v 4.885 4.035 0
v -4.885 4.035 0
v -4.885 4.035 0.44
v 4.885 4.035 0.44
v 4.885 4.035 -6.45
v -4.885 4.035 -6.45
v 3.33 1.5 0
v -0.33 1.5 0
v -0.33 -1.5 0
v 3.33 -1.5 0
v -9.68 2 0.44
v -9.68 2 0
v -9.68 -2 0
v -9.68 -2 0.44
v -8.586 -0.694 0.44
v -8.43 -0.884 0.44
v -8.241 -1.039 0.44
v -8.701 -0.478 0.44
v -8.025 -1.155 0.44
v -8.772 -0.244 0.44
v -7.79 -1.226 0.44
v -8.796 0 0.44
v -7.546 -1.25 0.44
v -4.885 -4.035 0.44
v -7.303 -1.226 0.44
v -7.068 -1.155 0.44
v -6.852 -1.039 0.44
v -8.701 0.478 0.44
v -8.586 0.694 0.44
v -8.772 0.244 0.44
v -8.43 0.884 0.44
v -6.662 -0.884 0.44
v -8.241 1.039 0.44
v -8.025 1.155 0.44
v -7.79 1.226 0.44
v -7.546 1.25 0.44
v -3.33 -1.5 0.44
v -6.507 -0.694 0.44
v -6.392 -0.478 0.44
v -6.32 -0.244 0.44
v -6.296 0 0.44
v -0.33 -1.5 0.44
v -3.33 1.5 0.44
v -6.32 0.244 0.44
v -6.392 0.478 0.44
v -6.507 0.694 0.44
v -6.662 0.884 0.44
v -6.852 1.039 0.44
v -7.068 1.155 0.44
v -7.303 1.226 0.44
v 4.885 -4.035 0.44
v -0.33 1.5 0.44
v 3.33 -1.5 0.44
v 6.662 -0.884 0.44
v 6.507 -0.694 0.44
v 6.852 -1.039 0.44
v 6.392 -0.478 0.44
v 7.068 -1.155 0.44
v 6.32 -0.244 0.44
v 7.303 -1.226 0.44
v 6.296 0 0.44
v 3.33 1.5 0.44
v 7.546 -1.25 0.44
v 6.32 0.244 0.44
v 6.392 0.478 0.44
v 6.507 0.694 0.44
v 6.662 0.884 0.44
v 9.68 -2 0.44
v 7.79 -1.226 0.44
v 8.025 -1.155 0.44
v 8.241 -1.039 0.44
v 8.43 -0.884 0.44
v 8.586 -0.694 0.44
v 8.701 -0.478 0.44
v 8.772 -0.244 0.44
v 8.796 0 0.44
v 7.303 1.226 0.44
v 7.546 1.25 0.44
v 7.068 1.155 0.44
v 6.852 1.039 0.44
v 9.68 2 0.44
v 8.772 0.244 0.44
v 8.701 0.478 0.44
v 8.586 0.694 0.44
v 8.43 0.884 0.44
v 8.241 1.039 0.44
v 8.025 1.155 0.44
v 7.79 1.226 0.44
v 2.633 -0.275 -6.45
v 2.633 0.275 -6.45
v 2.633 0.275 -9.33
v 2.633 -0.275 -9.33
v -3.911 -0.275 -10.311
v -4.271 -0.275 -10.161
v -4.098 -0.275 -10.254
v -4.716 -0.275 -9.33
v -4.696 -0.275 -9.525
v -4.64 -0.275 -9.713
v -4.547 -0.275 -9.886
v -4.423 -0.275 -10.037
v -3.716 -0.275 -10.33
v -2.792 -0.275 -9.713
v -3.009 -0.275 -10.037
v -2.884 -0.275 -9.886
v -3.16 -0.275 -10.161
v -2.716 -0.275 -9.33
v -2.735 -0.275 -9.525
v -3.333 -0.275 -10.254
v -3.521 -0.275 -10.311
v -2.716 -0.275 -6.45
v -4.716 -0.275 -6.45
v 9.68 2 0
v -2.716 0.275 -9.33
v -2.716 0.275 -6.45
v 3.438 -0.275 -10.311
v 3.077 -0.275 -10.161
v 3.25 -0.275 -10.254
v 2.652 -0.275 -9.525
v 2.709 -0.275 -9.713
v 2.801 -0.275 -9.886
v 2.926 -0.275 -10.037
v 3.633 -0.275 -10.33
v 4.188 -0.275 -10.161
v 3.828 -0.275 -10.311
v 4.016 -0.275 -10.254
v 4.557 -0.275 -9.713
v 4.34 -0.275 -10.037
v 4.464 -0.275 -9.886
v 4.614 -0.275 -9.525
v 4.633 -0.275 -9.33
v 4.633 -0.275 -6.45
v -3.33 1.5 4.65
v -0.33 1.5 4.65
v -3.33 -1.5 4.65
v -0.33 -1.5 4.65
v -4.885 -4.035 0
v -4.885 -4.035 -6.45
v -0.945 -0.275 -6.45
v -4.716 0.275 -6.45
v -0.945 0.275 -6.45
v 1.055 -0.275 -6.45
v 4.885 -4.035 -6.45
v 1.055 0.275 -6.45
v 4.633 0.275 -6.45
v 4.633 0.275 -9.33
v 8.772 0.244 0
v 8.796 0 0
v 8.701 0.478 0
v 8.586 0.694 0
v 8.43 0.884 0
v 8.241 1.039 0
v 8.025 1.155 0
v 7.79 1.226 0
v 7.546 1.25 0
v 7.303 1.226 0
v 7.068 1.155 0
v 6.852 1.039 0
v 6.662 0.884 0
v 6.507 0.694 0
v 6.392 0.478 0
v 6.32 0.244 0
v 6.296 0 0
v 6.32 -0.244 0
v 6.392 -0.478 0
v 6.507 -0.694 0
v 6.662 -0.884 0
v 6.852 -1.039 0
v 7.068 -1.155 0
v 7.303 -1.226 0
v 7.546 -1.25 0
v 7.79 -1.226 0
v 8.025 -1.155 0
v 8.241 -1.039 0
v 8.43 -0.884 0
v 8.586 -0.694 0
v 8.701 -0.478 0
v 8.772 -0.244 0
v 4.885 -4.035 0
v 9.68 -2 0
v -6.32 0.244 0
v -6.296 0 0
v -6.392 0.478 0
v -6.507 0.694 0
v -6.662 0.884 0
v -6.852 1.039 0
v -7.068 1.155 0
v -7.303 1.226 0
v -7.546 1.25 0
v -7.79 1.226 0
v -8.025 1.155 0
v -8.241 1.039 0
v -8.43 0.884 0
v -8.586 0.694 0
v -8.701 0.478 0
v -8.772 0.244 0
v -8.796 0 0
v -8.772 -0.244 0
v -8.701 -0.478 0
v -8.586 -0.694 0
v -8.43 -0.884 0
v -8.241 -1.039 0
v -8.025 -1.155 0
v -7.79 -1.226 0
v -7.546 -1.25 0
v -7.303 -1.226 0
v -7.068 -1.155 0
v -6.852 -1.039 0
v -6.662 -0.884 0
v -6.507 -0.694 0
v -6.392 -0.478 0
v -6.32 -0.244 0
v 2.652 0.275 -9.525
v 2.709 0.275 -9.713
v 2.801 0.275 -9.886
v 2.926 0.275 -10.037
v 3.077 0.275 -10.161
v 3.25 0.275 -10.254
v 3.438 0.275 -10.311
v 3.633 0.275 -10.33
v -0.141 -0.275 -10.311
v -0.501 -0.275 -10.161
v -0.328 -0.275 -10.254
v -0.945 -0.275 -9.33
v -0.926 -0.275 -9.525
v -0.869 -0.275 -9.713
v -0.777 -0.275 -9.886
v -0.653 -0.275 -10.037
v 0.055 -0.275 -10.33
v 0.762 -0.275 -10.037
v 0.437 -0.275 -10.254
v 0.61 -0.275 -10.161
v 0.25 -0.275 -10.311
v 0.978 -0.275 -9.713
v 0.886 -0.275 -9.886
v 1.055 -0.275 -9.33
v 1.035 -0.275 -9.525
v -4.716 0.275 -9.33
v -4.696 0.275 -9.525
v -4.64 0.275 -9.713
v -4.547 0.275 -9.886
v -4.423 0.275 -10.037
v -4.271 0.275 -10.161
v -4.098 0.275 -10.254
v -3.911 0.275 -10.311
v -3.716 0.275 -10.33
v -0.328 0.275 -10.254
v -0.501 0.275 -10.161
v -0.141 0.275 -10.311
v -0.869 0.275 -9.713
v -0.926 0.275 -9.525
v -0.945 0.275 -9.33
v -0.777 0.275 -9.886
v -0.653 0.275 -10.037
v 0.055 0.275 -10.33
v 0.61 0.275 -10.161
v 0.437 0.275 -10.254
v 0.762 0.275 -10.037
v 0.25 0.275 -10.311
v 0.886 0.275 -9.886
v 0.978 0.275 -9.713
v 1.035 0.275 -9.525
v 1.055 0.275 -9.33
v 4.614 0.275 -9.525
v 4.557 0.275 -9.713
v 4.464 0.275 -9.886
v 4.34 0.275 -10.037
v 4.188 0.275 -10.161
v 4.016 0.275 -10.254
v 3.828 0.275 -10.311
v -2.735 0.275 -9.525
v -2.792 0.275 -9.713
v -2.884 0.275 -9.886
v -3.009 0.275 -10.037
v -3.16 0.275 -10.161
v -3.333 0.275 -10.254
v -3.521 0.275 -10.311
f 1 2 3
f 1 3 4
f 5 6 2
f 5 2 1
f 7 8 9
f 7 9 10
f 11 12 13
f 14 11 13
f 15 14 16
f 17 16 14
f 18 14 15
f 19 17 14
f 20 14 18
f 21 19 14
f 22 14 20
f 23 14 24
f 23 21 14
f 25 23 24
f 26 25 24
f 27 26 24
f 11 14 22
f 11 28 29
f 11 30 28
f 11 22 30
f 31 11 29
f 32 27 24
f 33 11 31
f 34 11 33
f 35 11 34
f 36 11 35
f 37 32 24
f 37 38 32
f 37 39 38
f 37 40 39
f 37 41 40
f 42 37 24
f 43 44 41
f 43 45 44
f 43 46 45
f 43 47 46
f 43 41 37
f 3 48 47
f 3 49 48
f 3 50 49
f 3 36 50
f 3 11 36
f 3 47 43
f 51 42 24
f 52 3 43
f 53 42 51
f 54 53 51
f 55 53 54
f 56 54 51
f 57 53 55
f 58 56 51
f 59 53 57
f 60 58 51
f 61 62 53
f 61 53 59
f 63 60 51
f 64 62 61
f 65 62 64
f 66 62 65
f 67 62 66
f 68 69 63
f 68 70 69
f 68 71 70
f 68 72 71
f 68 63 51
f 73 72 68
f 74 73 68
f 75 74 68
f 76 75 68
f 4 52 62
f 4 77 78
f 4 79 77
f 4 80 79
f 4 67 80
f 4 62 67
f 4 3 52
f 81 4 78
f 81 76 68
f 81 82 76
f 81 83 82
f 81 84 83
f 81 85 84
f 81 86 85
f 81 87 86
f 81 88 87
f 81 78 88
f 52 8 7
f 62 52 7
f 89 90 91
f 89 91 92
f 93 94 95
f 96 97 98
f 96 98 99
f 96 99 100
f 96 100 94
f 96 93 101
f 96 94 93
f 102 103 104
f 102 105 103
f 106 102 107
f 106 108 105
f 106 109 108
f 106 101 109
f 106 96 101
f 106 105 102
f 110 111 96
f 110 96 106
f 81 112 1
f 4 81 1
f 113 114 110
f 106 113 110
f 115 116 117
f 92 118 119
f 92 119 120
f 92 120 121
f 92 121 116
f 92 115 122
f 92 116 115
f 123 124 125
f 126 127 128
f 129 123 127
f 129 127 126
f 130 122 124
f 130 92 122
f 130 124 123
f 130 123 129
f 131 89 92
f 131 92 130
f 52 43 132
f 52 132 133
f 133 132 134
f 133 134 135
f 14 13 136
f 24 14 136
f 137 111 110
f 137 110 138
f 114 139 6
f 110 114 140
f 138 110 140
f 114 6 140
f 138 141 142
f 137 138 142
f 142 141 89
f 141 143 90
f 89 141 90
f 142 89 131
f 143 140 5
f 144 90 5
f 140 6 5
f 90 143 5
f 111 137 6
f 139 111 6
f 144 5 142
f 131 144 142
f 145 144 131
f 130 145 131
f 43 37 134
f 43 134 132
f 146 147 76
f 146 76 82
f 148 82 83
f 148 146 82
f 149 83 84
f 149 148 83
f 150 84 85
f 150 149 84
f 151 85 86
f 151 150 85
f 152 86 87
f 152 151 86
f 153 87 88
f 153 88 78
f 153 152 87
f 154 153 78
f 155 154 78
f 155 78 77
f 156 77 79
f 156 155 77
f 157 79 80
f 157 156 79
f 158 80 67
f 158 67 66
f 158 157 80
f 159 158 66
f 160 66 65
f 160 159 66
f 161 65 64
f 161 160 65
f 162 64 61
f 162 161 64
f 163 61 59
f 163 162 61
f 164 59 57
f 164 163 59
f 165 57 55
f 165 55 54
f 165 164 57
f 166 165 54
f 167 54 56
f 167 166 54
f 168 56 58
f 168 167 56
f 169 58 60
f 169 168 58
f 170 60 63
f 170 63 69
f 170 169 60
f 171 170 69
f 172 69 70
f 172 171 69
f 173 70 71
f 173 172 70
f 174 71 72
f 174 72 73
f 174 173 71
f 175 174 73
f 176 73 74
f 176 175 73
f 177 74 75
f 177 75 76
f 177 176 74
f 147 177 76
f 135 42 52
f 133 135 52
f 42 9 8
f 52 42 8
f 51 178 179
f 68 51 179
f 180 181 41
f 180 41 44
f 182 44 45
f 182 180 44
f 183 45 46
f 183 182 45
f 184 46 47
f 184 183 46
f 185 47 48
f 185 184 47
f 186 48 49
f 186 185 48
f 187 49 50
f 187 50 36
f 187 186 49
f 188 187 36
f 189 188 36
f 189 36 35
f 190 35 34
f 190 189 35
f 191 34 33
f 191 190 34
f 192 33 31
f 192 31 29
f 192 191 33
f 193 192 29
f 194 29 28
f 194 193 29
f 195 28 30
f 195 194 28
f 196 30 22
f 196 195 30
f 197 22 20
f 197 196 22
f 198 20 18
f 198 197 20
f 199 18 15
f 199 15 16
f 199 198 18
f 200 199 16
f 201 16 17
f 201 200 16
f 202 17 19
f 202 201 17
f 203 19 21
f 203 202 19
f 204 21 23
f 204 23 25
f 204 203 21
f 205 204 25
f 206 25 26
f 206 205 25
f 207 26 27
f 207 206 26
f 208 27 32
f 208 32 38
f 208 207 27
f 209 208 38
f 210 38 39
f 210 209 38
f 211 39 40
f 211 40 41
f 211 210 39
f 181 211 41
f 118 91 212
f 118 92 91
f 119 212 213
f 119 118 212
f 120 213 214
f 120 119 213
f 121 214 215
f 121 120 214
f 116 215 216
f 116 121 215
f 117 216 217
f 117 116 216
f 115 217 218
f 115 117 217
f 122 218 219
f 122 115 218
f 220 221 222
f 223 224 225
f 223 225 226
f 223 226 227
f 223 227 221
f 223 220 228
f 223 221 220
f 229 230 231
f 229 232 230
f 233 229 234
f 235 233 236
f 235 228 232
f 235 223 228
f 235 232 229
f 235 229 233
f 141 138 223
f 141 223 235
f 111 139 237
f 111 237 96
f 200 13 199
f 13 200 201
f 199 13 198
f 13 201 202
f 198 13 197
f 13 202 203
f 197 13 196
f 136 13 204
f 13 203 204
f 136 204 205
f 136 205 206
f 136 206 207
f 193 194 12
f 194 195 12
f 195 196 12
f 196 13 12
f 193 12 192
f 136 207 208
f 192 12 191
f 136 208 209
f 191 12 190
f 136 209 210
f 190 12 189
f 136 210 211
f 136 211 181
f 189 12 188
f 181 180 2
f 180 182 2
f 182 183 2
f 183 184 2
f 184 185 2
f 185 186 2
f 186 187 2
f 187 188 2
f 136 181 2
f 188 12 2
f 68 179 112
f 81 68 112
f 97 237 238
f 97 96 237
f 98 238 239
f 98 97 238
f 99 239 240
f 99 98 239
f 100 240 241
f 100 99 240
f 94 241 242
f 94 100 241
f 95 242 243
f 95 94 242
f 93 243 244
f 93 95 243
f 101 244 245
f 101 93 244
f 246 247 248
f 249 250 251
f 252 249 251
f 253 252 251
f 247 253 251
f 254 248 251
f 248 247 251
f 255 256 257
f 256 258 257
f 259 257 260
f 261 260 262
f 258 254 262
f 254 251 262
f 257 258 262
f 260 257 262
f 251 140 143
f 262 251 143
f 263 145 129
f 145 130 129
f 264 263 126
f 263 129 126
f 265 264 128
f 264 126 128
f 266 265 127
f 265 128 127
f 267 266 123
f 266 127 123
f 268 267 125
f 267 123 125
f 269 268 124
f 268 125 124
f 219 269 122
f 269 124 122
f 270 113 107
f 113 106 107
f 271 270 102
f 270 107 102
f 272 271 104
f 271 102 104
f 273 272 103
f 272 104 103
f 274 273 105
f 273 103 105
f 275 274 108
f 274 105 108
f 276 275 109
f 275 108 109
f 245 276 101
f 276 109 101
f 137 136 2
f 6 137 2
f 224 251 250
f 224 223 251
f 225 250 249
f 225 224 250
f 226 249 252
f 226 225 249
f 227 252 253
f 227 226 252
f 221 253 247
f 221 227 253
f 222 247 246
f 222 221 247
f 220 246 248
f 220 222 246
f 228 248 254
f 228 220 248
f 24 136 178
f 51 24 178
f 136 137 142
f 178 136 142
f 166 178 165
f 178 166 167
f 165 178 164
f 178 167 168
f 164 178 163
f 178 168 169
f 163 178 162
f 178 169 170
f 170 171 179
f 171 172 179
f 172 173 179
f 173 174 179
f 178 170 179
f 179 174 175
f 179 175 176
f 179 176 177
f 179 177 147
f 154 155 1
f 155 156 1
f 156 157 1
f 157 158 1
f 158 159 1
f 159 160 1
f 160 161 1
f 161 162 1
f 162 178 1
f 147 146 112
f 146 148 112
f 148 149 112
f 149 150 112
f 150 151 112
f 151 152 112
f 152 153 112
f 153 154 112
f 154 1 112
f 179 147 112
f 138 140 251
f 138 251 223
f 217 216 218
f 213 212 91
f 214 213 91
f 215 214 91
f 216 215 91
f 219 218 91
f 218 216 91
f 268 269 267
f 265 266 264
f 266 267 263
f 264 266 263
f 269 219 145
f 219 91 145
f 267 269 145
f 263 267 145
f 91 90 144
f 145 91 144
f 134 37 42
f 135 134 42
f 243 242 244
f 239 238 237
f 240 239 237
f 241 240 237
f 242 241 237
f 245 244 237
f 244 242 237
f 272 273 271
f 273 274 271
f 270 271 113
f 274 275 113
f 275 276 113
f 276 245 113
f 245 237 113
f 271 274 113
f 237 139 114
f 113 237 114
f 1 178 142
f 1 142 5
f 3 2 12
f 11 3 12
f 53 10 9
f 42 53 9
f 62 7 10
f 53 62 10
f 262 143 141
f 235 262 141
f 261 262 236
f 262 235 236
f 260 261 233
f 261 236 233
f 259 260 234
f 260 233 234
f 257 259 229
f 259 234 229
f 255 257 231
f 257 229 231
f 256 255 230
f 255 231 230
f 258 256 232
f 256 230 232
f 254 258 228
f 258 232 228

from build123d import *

# Parameters (mm, degrees)
F0_W     = 3
F0_H     = 3
F1_DEPTH = 4.65
F0_W_2   = 9.77
F0_H_2   = 8.07
F0_W_3   = 3.66
F2_DEPTH = 6.45
F0_R     = 1.25
F3_DEPTH = 0.44
F4_W     = 2
F4_H     = 0.55
F5_DEPTH = 3.88
F6_R     = 0.99999


# Not quite as in the source:
# - a fillet or chamfer is up to 0.001 mm smaller than in the source, because OpenCascade refuses the exact size


with BuildPart() as f1:
    # F0 (on Top) → F1 (new body)
    with BuildSketch(Plane.XY):
        with Locations((-1.83, 0)):
            Rectangle(F0_W, F0_H)
    extrude(amount=F1_DEPTH)

    # F0 (on Top) → F2 (join)
    with BuildSketch(Plane.XY):
        Rectangle(F0_W_2, F0_H_2)
        Polygon((-3.33, -1.5), (-3.33, 1.5), (-0.33, 1.5), (3.33, 1.5), (3.33, -1.5), (-0.33, -1.5), align=None, mode=Mode.SUBTRACT)
        with Locations((1.5, 0)):
            Rectangle(F0_W_3, F0_H)
        with Locations((-1.83, 0)):
            Rectangle(F0_W, F0_H)
    extrude(amount=-F2_DEPTH)

    # F0 (on Top) → F3 (join)
    with BuildSketch(Plane.XY):
        Polygon((-4.885, -4.035), (-4.885, 4.035), (-9.68, 2), (-9.68, -2), align=None)
        with Locations((-7.5463647954, 0)):
            Circle(F0_R, mode=Mode.SUBTRACT)
        Rectangle(F0_W_2, F0_H_2)
        Polygon((-3.33, -1.5), (-3.33, 1.5), (-0.33, 1.5), (3.33, 1.5), (3.33, -1.5), (-0.33, -1.5), align=None, mode=Mode.SUBTRACT)
        Polygon((9.68, 2), (4.885, 4.035), (4.885, -4.035), (9.68, -2), align=None)
        with Locations((7.5463647954, 0)):
            Circle(F0_R, mode=Mode.SUBTRACT)
    extrude(amount=F3_DEPTH)

    # F4 (on face) → F5 (join)
    with BuildSketch(Plane(origin=(0, 0, -6.45), x_dir=(1, 0, 0), z_dir=(0, 0, -1))):
        with Locations((-3.7156233341, 0)):
            Rectangle(F4_W, F4_H)
        with Locations((0.0545115434, 0)):
            Rectangle(F4_W, F4_H)
        with Locations((3.6328930184, 0)):
            Rectangle(F4_W, F4_H)
    extrude(amount=F5_DEPTH)

    # F6 (radius 1 in the source; OpenCascade refuses exactly that, so slightly less here)
    f6_edges = [f1.edges().sort_by_distance(p)[0] for p in [
        (-2.715623, 0, -10.33),
        (-4.715623, 0, -10.33),
        (-0.945488, 0, -10.33),
        (1.054512, 0, -10.33),
        (2.632893, 0, -10.33),
        (4.632893, 0, -10.33),
    ]]
    fillet(f6_edges, radius=F6_R)


solid = f1.part
